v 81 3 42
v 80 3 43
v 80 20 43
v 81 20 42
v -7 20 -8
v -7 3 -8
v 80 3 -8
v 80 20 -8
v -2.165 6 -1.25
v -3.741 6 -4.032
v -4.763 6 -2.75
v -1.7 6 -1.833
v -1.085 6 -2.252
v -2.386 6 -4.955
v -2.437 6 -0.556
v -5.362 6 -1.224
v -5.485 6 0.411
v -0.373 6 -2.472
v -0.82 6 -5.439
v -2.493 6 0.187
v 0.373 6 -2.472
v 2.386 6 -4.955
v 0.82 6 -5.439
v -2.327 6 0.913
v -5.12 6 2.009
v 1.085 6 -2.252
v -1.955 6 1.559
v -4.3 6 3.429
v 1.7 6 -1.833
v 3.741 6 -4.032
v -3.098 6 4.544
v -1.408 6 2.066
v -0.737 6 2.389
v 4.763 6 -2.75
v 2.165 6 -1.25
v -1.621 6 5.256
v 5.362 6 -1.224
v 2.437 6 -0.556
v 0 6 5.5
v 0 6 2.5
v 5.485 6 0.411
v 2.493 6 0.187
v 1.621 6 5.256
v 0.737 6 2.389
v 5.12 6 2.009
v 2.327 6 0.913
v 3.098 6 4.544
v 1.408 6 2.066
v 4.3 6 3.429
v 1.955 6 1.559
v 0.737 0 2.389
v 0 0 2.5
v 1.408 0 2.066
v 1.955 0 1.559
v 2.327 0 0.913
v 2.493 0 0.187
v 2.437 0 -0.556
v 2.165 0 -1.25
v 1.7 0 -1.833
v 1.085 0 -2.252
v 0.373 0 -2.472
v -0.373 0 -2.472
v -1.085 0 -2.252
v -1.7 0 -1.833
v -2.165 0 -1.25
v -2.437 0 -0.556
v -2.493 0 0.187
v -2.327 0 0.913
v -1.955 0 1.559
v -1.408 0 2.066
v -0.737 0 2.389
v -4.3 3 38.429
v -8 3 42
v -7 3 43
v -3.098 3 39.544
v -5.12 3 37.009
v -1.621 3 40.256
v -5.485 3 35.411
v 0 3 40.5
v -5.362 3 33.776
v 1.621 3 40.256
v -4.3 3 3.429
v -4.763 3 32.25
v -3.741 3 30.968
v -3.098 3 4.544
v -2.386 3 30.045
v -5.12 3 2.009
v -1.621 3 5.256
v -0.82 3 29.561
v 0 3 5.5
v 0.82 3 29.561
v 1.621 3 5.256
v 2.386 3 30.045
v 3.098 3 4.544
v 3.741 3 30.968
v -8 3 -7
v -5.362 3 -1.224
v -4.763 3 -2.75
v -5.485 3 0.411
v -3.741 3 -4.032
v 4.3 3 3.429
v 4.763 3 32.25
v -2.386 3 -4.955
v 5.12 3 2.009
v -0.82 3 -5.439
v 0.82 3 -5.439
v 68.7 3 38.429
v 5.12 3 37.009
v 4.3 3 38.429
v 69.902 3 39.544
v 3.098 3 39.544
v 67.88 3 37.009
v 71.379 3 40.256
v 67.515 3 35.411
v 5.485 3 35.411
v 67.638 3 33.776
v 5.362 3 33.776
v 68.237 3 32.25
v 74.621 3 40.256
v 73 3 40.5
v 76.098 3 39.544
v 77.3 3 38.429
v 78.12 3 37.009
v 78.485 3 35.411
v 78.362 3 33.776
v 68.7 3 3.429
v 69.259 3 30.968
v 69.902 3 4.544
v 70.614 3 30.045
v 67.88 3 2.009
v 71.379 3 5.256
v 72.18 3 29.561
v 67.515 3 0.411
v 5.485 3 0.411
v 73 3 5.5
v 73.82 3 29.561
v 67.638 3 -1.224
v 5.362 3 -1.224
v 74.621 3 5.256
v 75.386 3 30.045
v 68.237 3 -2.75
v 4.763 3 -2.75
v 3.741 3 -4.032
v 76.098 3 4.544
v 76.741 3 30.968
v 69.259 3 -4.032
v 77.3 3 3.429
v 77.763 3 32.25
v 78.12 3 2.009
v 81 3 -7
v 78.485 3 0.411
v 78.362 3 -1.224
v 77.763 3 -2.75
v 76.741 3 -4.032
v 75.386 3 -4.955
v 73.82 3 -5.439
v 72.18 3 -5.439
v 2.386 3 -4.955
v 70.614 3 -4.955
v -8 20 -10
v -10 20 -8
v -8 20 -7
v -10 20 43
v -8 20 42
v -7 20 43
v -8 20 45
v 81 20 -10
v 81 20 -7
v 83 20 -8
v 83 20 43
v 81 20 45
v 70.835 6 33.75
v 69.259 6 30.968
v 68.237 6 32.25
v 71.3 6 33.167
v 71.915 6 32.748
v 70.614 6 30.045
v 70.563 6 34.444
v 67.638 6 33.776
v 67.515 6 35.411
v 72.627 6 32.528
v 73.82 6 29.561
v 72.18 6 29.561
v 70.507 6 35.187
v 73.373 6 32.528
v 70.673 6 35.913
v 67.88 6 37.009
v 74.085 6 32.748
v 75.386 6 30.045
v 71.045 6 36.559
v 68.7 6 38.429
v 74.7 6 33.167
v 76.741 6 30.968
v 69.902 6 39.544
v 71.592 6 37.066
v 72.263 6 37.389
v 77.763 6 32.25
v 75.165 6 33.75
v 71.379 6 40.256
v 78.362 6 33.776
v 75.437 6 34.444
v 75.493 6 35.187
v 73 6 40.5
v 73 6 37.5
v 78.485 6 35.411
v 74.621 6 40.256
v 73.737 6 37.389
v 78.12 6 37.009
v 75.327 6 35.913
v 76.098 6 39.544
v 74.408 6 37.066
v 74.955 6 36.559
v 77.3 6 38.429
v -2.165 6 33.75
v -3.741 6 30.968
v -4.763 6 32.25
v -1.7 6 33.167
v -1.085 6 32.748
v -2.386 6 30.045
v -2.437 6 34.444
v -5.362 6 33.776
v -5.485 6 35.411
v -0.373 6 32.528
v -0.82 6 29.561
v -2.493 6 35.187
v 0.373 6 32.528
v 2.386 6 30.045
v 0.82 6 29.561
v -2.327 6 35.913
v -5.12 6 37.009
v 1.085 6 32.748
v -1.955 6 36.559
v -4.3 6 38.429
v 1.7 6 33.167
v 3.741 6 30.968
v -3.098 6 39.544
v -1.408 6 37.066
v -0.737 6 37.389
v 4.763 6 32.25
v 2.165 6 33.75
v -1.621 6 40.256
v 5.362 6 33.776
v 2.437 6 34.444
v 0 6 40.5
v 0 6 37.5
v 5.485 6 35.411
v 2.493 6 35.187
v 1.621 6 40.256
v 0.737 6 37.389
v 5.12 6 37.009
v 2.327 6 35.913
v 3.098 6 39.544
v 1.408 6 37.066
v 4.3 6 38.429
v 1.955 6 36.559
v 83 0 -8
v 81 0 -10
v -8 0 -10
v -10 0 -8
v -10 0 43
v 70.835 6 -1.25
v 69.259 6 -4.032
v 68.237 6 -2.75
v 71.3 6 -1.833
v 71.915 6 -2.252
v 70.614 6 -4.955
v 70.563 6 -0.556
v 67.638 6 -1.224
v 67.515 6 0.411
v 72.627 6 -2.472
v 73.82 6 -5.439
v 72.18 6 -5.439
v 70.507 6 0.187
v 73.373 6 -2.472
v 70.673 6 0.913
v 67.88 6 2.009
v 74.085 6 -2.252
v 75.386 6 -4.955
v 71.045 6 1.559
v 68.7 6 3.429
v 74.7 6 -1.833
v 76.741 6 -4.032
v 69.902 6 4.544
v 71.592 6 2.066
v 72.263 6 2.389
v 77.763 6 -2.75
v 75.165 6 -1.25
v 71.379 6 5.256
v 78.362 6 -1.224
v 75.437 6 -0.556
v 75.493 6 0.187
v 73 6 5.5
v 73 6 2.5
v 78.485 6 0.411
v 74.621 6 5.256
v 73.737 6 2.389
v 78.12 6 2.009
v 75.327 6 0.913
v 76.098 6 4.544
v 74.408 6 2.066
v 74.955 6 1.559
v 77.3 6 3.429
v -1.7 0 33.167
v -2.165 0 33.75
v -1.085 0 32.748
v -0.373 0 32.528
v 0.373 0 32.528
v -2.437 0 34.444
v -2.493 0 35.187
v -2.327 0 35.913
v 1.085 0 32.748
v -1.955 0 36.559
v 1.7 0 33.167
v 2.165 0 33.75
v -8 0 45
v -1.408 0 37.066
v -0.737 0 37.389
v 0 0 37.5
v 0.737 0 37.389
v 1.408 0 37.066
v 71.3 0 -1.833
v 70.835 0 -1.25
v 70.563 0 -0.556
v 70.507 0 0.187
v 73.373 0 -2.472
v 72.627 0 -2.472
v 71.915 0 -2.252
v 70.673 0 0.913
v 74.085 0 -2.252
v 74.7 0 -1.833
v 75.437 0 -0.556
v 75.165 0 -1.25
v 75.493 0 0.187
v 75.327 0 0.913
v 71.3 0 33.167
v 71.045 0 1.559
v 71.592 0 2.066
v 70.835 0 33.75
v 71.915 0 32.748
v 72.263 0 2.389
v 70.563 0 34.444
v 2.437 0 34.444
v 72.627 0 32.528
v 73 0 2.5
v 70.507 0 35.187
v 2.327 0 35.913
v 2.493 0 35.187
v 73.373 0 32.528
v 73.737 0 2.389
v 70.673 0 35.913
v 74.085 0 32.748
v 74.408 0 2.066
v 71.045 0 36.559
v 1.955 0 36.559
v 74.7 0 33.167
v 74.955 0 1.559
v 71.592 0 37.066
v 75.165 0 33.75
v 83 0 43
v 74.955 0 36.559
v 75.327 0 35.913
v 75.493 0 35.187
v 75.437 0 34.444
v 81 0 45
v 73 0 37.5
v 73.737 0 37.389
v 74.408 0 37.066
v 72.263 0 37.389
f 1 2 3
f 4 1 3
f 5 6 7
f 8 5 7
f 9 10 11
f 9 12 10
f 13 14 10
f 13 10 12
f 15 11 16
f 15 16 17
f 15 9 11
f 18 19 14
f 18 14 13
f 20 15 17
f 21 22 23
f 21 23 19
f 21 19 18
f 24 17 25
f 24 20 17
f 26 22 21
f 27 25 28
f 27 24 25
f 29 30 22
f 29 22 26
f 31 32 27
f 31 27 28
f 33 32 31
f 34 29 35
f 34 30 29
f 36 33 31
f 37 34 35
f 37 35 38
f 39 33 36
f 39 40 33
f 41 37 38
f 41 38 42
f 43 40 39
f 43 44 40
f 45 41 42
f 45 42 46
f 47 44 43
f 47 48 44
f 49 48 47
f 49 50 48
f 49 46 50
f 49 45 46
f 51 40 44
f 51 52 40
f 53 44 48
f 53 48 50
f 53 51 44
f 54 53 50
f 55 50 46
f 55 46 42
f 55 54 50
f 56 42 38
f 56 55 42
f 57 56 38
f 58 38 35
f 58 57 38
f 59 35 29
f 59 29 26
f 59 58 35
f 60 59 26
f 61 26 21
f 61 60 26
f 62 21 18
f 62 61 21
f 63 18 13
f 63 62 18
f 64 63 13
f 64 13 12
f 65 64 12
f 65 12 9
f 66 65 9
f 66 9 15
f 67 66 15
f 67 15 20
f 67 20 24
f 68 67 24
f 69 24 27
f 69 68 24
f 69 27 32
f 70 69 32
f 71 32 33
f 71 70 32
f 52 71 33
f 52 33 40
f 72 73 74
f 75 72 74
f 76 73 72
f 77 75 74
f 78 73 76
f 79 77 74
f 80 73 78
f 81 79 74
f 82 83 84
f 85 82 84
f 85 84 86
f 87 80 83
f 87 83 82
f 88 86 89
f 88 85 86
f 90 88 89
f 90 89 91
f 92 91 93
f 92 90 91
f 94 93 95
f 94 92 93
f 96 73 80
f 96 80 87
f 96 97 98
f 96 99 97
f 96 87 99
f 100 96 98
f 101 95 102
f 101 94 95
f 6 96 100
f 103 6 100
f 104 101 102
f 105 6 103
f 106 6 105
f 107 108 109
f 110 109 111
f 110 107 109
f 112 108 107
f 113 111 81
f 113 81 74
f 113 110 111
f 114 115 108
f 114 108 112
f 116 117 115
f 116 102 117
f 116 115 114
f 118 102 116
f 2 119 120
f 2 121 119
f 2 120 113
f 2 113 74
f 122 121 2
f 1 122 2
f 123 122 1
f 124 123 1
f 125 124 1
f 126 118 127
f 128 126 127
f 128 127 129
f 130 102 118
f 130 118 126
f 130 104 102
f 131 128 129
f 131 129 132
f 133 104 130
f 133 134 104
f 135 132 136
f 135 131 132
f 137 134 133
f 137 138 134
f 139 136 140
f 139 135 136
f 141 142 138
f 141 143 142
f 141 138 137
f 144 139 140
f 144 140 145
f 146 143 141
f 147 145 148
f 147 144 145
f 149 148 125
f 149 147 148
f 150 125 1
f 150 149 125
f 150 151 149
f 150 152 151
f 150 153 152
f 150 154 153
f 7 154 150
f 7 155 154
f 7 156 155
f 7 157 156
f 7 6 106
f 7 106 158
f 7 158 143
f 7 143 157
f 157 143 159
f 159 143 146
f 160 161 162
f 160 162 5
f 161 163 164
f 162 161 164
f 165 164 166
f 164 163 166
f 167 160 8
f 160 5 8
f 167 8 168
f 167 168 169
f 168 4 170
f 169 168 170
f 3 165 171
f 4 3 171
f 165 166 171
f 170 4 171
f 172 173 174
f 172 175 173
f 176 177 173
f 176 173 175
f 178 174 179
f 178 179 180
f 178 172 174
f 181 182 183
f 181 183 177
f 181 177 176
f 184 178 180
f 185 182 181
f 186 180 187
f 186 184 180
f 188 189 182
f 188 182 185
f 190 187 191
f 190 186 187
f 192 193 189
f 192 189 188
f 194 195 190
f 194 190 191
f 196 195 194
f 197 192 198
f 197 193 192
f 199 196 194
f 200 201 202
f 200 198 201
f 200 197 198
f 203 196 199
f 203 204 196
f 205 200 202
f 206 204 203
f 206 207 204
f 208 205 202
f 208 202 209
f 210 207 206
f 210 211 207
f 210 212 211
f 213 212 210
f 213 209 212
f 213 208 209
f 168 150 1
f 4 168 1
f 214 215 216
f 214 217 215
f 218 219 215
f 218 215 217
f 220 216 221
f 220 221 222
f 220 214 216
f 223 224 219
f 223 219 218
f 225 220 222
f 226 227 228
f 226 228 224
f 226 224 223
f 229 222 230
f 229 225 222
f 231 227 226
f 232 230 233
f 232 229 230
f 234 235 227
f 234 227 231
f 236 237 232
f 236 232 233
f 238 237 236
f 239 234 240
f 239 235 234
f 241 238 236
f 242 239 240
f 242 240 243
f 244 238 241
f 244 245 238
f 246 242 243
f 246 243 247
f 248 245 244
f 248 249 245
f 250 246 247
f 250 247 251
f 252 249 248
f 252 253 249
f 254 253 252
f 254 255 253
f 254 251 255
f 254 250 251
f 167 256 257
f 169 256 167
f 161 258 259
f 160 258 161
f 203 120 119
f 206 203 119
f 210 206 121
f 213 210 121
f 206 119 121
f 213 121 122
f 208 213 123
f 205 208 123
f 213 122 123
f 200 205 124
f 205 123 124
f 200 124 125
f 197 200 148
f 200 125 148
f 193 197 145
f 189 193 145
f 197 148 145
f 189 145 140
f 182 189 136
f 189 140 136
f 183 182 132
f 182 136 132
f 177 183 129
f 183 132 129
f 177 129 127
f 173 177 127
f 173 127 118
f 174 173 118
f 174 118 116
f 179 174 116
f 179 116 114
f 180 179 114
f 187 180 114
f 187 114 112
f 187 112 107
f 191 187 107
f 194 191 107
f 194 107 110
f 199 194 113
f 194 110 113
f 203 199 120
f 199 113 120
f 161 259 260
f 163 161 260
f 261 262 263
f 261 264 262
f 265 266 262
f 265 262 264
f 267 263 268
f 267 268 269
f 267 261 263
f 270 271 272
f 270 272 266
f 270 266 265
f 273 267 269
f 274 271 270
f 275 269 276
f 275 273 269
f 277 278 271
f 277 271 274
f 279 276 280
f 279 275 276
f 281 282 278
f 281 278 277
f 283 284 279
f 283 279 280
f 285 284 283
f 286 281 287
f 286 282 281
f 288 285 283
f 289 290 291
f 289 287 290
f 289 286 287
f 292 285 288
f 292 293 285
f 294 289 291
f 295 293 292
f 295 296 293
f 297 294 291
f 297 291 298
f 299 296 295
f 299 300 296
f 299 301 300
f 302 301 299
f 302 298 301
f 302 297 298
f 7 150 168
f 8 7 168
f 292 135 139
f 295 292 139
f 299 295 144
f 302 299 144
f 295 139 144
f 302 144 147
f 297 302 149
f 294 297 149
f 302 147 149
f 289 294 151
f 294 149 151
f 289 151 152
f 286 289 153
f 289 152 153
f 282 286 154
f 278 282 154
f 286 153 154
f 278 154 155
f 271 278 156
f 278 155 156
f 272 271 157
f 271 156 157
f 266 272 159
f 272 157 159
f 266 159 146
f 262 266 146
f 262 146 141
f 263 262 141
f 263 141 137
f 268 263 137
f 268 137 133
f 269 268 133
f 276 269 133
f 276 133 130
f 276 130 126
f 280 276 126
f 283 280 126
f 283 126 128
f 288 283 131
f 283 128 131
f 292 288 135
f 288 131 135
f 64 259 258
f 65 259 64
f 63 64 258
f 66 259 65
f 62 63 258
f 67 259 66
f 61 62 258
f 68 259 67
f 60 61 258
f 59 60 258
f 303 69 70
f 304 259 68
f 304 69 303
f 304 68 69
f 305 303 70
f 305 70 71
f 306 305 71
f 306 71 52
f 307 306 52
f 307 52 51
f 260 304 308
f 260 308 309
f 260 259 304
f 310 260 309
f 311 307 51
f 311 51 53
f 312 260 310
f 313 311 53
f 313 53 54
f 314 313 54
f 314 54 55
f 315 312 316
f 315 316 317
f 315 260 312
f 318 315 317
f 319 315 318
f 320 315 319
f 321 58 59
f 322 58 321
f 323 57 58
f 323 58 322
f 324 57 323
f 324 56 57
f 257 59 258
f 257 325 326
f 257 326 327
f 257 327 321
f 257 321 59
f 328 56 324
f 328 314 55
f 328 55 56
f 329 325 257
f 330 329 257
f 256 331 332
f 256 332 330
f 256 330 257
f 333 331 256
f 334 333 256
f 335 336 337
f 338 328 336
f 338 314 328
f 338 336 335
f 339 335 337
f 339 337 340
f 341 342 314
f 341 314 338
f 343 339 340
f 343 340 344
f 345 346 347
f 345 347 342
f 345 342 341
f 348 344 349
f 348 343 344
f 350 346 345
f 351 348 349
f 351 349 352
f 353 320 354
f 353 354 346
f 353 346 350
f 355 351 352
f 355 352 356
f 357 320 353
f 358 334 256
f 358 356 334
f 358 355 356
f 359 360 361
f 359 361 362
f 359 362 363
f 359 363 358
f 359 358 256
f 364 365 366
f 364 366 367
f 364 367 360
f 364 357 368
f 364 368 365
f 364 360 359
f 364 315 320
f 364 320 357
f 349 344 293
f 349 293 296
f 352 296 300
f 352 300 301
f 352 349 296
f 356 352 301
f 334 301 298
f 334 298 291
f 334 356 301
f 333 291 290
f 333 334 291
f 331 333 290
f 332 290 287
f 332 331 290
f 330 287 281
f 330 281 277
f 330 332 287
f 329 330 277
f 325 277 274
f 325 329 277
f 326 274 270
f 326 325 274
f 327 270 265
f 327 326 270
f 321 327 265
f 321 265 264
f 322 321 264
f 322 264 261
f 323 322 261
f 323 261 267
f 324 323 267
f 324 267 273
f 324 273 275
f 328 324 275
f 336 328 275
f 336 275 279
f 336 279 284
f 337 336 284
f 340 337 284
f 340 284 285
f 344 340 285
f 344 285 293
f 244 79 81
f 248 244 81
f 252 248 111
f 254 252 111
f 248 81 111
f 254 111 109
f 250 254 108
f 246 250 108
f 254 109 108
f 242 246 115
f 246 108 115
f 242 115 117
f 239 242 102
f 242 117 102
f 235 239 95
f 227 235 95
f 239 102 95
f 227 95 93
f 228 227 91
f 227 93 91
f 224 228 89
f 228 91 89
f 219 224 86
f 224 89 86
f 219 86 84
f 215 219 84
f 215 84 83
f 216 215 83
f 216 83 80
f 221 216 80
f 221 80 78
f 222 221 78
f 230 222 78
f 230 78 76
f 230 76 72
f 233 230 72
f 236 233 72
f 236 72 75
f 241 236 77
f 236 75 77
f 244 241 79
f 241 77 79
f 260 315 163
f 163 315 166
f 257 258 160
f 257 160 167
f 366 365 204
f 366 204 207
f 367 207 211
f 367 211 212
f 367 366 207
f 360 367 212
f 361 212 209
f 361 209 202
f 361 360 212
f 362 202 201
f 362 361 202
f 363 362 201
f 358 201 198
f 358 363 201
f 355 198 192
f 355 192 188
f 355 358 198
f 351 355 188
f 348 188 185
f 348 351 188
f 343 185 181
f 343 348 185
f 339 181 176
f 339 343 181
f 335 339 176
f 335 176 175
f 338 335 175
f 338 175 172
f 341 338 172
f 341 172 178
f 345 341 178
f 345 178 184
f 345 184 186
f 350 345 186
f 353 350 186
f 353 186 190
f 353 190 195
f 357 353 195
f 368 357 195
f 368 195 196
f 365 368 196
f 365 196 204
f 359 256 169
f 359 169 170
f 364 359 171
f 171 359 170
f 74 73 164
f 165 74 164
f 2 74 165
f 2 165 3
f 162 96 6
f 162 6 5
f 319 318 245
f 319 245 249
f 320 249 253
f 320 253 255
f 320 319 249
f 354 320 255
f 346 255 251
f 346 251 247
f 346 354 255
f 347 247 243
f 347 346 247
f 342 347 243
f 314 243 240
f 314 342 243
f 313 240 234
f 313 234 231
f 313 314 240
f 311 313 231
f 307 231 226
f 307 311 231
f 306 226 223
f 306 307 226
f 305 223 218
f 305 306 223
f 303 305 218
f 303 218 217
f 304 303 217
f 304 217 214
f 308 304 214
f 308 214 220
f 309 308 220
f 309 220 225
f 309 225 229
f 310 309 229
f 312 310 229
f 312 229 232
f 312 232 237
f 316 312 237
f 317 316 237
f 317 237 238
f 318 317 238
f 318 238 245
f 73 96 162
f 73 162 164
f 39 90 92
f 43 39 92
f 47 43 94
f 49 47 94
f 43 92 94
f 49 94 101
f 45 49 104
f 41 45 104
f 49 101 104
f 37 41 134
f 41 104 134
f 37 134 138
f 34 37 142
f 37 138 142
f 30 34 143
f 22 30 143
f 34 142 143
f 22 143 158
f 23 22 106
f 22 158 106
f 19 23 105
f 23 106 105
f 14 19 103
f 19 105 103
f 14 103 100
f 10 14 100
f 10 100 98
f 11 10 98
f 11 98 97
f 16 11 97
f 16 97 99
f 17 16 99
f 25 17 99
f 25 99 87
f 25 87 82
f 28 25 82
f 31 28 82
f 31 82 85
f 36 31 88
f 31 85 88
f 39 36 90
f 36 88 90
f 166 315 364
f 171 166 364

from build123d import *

# Parameters (mm, degrees)
SKETCH1_W           = 89
SKETCH1_H           = 51
SKETCH1_R           = 2.5
BOSS_EXTRUDE1_DEPTH = 3
SKETCH2_R           = 5.5
SKETCH2_R_2         = 2.5
BOSS_EXTRUDE2_DEPTH = 3
SKETCH3_W           = 93
SKETCH3_H           = 55
SKETCH3_W_2         = 89
SKETCH3_H_2         = 51
BOSS_EXTRUDE3_DEPTH = 20
CHAMFER1_SIZE       = 2
CHAMFER2_SIZE       = 1


with BuildPart() as part:
    # Sketch1 → Boss-Extrude1 (new body)
    with BuildSketch(Plane(origin=(0, 0, 0), x_dir=(1, 0, 0), z_dir=(0, 1, 0))):
        with Locations((36.5, -17.5)):
            Rectangle(SKETCH1_W, SKETCH1_H)
        with Locations(Location((0, 0, 0), (0, 0, 270))):
            Circle(SKETCH1_R, mode=Mode.SUBTRACT)
        with Locations(Location((73, 0, 0), (0, 0, 270))):
            Circle(SKETCH1_R, mode=Mode.SUBTRACT)
        with Locations(Location((0, -35, 0), (0, 0, 270))):
            Circle(SKETCH1_R, mode=Mode.SUBTRACT)
        with Locations(Location((73, -35, 0), (0, 0, 270))):
            Circle(SKETCH1_R, mode=Mode.SUBTRACT)
    extrude(amount=BOSS_EXTRUDE1_DEPTH)

    # Sketch2 → Boss-Extrude2 (add)
    # profile 1 of 4: a face of its own
    with BuildSketch(Plane(origin=(0, 3, 0), x_dir=(1, 0, 0), z_dir=(0, 1, 0))):
        with Locations(Location((0, 0, 0), (0, 0, 270))):
            Circle(SKETCH2_R)
        with Locations(Location((0, 0, 0), (0, 0, 270))):
            Circle(SKETCH2_R_2, mode=Mode.SUBTRACT)
    # profile 2 of 4: a face of its own
    with BuildSketch(Plane(origin=(0, 3, 0), x_dir=(1, 0, 0), z_dir=(0, 1, 0))):
        with Locations(Location((73, 0, 0), (0, 0, 270))):
            Circle(SKETCH2_R)
        with Locations(Location((73, 0, 0), (0, 0, 270))):
            Circle(SKETCH2_R_2, mode=Mode.SUBTRACT)
    # profile 3 of 4: a face of its own
    with BuildSketch(Plane(origin=(0, 3, 0), x_dir=(1, 0, 0), z_dir=(0, 1, 0))):
        with Locations(Location((73, -35, 0), (0, 0, 270))):
            Circle(SKETCH2_R)
        with Locations(Location((73, -35, 0), (0, 0, 270))):
            Circle(SKETCH2_R_2, mode=Mode.SUBTRACT)
    # profile 4 of 4: a face of its own
    with BuildSketch(Plane(origin=(0, 3, 0), x_dir=(1, 0, 0), z_dir=(0, 1, 0))):
        with Locations(Location((0, -35, 0), (0, 0, 270))):
            Circle(SKETCH2_R)
        with Locations(Location((0, -35, 0), (0, 0, 270))):
            Circle(SKETCH2_R_2, mode=Mode.SUBTRACT)
    extrude(amount=BOSS_EXTRUDE2_DEPTH)

    # Sketch3 → Boss-Extrude3 (add)
    with BuildSketch(Plane.XZ):
        with Locations((36.5, 17.5)):
            Rectangle(SKETCH3_W, SKETCH3_H)
        with Locations((36.5, 17.5)):
            Rectangle(SKETCH3_W_2, SKETCH3_H_2, mode=Mode.SUBTRACT)
    extrude(amount=-BOSS_EXTRUDE3_DEPTH)

    # Chamfer1
    chamfer1_edges = [part.edges().sort_by_distance(p)[0] for p in [
        (-10, 10, 45),
        (83, 10, 45),
        (83, 10, -10),
        (-10, 10, -10),
    ]]
    chamfer(chamfer1_edges, length=CHAMFER1_SIZE)

    # Chamfer2
    chamfer2_edges = [part.edges().sort_by_distance(p)[0] for p in [
        (81, 11.5, 43),
        (81, 11.5, -8),
        (-8, 11.5, -8),
        (-8, 11.5, 43),
    ]]
    chamfer(chamfer2_edges, length=CHAMFER2_SIZE)


solid = part.part
